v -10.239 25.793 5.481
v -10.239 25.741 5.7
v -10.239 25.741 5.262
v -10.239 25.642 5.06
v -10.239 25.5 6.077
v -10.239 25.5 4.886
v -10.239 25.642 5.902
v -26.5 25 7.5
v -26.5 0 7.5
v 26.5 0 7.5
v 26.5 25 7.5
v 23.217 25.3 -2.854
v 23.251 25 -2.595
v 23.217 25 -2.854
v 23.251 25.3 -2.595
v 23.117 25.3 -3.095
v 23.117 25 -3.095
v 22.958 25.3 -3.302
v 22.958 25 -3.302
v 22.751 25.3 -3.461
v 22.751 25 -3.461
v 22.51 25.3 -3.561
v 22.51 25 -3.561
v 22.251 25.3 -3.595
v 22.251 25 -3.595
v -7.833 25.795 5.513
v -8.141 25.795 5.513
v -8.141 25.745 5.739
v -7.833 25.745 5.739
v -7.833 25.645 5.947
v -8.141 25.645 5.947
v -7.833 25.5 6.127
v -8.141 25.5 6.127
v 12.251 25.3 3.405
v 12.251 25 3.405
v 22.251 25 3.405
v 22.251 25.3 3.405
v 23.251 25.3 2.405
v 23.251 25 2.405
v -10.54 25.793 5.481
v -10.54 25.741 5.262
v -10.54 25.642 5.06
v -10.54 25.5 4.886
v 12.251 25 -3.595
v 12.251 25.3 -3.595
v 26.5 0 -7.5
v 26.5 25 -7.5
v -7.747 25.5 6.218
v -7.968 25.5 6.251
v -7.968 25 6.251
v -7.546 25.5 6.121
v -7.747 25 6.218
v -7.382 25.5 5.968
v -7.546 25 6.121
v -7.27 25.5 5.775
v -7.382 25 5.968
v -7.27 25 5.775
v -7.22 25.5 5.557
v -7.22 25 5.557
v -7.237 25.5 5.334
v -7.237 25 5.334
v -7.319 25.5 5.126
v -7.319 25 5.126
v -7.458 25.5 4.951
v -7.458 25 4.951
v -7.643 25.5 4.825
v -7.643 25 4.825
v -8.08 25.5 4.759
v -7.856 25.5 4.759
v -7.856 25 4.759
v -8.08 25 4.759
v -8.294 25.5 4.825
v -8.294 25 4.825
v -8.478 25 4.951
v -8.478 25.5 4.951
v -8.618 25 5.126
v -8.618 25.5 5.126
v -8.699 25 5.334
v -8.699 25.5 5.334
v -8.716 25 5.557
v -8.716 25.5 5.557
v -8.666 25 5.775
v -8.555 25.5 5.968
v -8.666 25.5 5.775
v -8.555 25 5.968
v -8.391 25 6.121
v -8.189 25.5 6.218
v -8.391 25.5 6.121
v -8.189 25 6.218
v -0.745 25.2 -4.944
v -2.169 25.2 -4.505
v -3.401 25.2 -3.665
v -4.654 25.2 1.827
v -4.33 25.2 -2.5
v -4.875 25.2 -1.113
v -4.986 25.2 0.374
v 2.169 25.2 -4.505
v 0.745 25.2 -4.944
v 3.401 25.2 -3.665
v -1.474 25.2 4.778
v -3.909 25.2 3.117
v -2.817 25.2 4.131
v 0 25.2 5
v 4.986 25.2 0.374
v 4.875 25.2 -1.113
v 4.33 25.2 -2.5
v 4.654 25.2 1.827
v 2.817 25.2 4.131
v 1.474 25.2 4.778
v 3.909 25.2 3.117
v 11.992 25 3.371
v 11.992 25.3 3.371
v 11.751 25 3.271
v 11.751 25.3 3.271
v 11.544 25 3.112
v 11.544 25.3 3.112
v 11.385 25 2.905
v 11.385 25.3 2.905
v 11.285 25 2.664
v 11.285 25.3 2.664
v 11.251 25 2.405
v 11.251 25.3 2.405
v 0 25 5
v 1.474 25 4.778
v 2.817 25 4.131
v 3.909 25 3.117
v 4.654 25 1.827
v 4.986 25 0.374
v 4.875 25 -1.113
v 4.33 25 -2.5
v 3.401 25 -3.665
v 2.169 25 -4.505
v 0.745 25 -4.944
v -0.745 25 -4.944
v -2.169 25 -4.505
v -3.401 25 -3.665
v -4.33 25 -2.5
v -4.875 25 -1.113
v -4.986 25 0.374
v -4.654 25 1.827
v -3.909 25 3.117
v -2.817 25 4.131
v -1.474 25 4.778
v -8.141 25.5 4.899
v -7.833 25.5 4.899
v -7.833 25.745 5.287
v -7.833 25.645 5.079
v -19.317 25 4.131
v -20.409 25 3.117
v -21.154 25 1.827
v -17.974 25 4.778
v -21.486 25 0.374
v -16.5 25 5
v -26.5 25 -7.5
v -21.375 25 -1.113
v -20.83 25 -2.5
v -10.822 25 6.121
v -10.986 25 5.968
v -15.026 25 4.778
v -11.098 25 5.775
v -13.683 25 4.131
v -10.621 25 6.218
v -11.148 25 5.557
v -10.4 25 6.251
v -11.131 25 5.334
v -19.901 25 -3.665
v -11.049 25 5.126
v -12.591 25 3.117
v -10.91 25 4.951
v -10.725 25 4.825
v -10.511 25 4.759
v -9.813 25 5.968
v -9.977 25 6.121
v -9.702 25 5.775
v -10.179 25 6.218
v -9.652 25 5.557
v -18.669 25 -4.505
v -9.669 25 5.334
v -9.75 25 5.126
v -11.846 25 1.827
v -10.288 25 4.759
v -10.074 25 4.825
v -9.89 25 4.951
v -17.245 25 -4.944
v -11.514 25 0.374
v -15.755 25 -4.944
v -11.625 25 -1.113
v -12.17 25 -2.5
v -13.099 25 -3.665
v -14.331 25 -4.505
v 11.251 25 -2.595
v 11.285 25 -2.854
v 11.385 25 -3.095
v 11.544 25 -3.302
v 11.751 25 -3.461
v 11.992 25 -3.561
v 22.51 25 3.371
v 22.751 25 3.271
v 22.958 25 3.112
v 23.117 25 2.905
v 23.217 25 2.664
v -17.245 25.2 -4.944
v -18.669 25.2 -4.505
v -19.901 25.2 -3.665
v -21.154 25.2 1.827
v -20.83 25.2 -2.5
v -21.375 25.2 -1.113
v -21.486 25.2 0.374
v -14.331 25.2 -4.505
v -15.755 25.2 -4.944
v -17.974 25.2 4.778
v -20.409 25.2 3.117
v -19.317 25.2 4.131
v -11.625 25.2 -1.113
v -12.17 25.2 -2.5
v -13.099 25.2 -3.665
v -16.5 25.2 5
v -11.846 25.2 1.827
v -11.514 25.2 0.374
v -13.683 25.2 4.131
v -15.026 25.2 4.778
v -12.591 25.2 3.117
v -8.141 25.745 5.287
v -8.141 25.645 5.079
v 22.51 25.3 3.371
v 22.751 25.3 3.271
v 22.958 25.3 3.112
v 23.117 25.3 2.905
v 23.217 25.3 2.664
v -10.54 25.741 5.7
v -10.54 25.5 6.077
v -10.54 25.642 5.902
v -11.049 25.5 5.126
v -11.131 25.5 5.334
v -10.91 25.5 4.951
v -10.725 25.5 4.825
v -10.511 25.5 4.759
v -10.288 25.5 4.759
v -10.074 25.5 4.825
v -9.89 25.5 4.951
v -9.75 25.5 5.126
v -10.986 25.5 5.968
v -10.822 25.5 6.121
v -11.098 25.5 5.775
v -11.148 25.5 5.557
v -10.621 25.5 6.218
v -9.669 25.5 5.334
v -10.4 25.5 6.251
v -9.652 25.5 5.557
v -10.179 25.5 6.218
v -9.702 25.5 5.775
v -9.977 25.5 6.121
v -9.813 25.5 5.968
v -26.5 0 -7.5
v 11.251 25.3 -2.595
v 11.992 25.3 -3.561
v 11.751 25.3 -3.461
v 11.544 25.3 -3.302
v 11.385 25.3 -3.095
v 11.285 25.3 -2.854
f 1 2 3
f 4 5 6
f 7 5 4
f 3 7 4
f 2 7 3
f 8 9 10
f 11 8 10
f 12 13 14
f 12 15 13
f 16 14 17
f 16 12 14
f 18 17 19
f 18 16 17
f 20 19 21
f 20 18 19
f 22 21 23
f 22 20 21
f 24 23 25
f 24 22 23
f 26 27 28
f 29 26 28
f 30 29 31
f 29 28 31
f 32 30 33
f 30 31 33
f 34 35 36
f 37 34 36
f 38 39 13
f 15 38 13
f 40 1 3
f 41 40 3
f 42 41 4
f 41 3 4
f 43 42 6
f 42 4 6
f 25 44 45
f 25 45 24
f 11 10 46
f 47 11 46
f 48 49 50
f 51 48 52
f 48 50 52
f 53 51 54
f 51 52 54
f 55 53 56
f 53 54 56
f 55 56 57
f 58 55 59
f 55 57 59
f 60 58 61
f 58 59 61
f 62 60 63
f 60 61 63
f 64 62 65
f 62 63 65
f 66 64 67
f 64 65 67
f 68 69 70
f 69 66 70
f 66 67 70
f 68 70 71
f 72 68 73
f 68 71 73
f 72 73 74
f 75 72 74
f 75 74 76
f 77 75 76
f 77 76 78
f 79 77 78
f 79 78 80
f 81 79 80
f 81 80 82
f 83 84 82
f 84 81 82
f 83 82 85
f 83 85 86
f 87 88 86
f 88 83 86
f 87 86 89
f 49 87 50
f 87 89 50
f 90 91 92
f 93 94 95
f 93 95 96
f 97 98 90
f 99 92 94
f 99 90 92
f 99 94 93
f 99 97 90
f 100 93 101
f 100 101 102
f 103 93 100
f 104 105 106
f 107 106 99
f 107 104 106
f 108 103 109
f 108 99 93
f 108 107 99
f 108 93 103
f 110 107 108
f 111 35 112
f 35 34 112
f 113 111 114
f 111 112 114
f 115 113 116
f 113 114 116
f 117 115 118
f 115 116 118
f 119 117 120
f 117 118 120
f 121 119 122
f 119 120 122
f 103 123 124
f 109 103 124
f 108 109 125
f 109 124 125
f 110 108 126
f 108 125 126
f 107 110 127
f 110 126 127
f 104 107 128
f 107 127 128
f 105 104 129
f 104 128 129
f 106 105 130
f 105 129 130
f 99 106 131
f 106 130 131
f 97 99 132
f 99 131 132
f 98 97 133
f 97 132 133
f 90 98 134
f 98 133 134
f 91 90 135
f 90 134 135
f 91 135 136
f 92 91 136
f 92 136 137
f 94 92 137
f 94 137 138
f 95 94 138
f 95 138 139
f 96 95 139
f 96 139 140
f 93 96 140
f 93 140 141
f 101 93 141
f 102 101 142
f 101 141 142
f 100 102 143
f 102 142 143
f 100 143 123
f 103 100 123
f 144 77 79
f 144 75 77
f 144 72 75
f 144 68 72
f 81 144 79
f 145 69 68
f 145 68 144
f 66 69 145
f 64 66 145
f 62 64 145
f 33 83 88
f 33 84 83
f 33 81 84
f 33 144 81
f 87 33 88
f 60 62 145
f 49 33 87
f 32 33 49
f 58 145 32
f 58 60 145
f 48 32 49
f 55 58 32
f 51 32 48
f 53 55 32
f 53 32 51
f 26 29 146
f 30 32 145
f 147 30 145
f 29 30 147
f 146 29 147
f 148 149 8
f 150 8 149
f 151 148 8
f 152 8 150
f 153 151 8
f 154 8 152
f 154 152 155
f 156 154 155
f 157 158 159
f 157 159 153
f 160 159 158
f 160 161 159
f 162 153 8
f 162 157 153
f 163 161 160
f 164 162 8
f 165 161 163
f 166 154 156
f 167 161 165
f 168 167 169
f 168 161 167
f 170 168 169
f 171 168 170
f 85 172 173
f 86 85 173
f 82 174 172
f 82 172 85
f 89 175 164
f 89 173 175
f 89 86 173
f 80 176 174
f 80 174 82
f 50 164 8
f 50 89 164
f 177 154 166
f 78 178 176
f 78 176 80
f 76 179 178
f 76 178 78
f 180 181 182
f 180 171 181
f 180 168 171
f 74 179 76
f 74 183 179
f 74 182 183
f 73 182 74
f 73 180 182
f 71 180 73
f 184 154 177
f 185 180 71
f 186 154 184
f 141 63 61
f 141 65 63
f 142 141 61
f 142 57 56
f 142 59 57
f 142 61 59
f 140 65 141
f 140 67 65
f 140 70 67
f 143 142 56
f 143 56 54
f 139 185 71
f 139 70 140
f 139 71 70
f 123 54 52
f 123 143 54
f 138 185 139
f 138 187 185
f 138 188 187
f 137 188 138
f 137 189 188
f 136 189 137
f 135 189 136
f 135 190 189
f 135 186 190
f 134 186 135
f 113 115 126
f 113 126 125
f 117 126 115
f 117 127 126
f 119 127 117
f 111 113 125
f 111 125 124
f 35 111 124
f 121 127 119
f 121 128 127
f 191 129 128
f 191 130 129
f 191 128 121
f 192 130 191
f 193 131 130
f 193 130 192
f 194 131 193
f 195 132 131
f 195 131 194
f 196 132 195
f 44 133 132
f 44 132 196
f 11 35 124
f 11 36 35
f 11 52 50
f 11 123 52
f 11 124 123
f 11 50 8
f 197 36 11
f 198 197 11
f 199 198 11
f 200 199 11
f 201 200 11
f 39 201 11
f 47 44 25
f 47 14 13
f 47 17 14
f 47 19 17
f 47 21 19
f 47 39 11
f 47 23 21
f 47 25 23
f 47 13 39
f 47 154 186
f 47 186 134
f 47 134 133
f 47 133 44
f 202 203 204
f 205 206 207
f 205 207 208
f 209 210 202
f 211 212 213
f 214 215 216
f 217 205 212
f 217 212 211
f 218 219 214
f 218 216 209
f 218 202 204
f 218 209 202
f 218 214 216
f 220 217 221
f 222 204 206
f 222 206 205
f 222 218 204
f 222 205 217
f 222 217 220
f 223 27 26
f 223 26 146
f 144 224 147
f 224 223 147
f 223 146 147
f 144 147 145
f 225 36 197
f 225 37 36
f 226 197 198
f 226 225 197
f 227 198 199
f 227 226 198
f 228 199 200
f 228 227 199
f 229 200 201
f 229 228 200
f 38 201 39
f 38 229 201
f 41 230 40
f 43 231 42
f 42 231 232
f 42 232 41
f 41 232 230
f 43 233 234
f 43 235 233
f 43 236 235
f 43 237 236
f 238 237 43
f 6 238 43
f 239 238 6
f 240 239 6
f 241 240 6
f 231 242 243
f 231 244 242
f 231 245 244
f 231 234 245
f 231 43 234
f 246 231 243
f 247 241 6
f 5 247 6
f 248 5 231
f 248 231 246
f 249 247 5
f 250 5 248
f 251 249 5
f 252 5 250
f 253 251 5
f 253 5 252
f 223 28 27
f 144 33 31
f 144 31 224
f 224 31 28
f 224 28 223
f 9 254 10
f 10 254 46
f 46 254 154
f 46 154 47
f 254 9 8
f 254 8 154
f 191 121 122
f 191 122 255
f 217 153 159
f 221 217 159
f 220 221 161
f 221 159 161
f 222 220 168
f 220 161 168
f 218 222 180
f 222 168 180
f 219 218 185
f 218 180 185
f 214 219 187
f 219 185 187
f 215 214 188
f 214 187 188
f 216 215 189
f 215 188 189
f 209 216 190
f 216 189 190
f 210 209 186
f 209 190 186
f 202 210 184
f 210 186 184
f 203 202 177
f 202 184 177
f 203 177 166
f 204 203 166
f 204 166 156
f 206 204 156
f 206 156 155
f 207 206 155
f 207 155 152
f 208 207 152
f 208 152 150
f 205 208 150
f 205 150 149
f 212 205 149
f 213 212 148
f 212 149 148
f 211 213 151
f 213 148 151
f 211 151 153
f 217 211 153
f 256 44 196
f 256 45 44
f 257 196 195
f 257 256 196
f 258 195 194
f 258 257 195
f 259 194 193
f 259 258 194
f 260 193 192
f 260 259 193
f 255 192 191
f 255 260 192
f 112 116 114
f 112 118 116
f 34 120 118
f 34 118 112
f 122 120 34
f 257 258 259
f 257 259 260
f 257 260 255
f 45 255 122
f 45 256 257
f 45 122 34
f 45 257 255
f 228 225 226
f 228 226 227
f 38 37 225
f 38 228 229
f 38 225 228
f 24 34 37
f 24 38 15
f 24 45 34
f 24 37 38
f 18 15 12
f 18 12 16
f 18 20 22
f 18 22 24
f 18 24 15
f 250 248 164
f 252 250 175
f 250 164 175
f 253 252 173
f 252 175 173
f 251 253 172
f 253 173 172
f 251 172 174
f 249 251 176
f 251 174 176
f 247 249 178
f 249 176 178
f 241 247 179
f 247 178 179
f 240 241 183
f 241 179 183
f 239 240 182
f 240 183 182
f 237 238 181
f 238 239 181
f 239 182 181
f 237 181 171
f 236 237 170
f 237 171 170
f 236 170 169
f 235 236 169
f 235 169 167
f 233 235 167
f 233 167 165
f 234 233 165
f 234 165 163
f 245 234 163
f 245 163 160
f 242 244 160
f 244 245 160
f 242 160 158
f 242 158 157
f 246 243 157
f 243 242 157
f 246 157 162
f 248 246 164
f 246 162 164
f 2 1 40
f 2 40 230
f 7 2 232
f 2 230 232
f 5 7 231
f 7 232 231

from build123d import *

# Parameters (mm, degrees)
SKETCH_1_W      = 53
SKETCH_1_H      = 15
EXTRUDE_1_DEPTH = 25
SKETCH_2_R      = 5
EXTRUDE_2_DEPTH = 0.2
SKETCH_3_R      = 0.75
EXTRUDE_4_DEPTH = 0.5
SKETCH_4_W      = 0.308010804
SKETCH_4_H      = 1.227700604
EXTRUDE_5_DEPTH = 0.3
SKETCH_6_W      = 0.300930155
SKETCH_6_H      = 1.191236652
EXTRUDE_8_DEPTH = 0.3
SKETCH_8_W      = 12
SKETCH_8_H      = 7
EXTRUDE_9_DEPTH = 0.3
FILLET_1_R      = 1
FILLET_2_R      = 1


with BuildPart() as part:
    # 草圖1 → 填料-伸長1 (new body)
    with BuildSketch(Plane(origin=(0, 0, 0), x_dir=(1, 0, 0), z_dir=(0, 1, 0))):
        Rectangle(SKETCH_1_W, SKETCH_1_H)
    extrude(amount=EXTRUDE_1_DEPTH)

    # 草圖2 → 填料-伸長2 (add)
    with BuildSketch(Plane(origin=(0, 25, 0), x_dir=(1, 0, 0), z_dir=(0, 1, 0))):
        with Locations(Location((0, 0, 0), (0, 0, 270))):
            Circle(SKETCH_2_R)
        with Locations(Location((-16.5, 0, 0), (0, 0, 270))):
            Circle(SKETCH_2_R)
    extrude(amount=EXTRUDE_2_DEPTH)

    # 草圖3 → 填料-伸長4 (add)
    with BuildSketch(Plane(origin=(0, 25, 0), x_dir=(1, 0, 0), z_dir=(0, 1, 0))):
        with Locations(Location((-7.968179653, -5.500848642, 0), (0, 0, 270))):
            Circle(SKETCH_3_R)
        with Locations(Location((-10.399702952, -5.500848642, 0), (0, 0, 270))):
            Circle(SKETCH_3_R)
    extrude(amount=EXTRUDE_4_DEPTH)

    # 草圖4 → 填料-伸長5 (add)
    with BuildSketch(Plane(origin=(0, 25.5, 0), x_dir=(1, 0, 0), z_dir=(0, 1, 0))):
        with Locations((-7.986543435, -5.513019863)):
            Rectangle(SKETCH_4_W, SKETCH_4_H)
    extrude(amount=EXTRUDE_5_DEPTH)

    # 草圖6 → 填料-伸長8 (add)
    with BuildSketch(Plane(origin=(0, 25.5, 0), x_dir=(1, 0, 0), z_dir=(0, 1, 0))):
        with Locations((-10.389863122, -5.481431278)):
            Rectangle(SKETCH_6_W, SKETCH_6_H)
    extrude(amount=EXTRUDE_8_DEPTH)

    # 草圖8 → 填料-伸長9 (add)
    with BuildSketch(Plane(origin=(0, 25, 0), x_dir=(1, 0, 0), z_dir=(0, 1, 0))):
        with Locations((17.250728111, 0.094744835)):
            Rectangle(SKETCH_8_W, SKETCH_8_H)
    extrude(amount=EXTRUDE_9_DEPTH)

    # 圓角1
    fillet_1_edges = [part.edges().sort_by_distance(p)[0] for p in [
        (23.250728111, 25.15, 3.405255165),
        (23.250728111, 25.15, -3.594744835),
        (11.250728111, 25.15, -3.594744835),
        (11.250728111, 25.15, 3.405255165),
    ]]
    fillet(fillet_1_edges, radius=FILLET_1_R)

    # 圓角2
    # the kernel refuses this fillet: 1 mm, written as the material it takes off along each edge
    with BuildSketch(Plane(origin=(-8.454040937, 25.8, 4.885812952), x_dir=(0, -1, 0), z_dir=(-1, 0, 0)), Plane(origin=(-12.325685306, 25.8, 6.077049604), x_dir=(0, -1, 0), z_dir=(1, 0, 0))) as fillet_2_piece_1:
        with BuildLine():
            CenterArc((1, 0.714142843), FILLET_2_R, 180, 45.572995999)
            Line((0, 0.714142843), (-0.02, 0.714142843))
            Line((-0.02, 0.714142843), (-0.02, 0))
            Line((-0.02, 0), (0, -0.02))
            ThreePointArc((0, -0.02), (0.15, -0.02), (0.286, -0.014282857))
            Line((0.286, -0.014282857), (0.3, 0))
        make_face()
    extrude(amount=3.871644369, mode=Mode.SUBTRACT)
    with BuildSketch(Plane(origin=(-9.925905944, 25.8, 6.126870165), x_dir=(0, -1, 0), z_dir=(1, 0, 0)), Plane(origin=(-6.047180926, 25.8, 4.899169561), x_dir=(0, -1, 0), z_dir=(-1, 0, 0))) as fillet_2_piece_2:
        with BuildLine():
            CenterArc((1, 0.714142843), FILLET_2_R, 180, 45.572995999)
            Line((0, 0.714142843), (-0.02, 0.714142843))
            Line((-0.02, 0.714142843), (-0.02, 0))
            Line((-0.02, 0), (0, -0.02))
            ThreePointArc((0, -0.02), (0.15, -0.02), (0.286, -0.014282857))
            Line((0.286, -0.014282857), (0.3, 0))
        make_face()
    extrude(amount=3.878725018, mode=Mode.SUBTRACT)


solid = part.part
